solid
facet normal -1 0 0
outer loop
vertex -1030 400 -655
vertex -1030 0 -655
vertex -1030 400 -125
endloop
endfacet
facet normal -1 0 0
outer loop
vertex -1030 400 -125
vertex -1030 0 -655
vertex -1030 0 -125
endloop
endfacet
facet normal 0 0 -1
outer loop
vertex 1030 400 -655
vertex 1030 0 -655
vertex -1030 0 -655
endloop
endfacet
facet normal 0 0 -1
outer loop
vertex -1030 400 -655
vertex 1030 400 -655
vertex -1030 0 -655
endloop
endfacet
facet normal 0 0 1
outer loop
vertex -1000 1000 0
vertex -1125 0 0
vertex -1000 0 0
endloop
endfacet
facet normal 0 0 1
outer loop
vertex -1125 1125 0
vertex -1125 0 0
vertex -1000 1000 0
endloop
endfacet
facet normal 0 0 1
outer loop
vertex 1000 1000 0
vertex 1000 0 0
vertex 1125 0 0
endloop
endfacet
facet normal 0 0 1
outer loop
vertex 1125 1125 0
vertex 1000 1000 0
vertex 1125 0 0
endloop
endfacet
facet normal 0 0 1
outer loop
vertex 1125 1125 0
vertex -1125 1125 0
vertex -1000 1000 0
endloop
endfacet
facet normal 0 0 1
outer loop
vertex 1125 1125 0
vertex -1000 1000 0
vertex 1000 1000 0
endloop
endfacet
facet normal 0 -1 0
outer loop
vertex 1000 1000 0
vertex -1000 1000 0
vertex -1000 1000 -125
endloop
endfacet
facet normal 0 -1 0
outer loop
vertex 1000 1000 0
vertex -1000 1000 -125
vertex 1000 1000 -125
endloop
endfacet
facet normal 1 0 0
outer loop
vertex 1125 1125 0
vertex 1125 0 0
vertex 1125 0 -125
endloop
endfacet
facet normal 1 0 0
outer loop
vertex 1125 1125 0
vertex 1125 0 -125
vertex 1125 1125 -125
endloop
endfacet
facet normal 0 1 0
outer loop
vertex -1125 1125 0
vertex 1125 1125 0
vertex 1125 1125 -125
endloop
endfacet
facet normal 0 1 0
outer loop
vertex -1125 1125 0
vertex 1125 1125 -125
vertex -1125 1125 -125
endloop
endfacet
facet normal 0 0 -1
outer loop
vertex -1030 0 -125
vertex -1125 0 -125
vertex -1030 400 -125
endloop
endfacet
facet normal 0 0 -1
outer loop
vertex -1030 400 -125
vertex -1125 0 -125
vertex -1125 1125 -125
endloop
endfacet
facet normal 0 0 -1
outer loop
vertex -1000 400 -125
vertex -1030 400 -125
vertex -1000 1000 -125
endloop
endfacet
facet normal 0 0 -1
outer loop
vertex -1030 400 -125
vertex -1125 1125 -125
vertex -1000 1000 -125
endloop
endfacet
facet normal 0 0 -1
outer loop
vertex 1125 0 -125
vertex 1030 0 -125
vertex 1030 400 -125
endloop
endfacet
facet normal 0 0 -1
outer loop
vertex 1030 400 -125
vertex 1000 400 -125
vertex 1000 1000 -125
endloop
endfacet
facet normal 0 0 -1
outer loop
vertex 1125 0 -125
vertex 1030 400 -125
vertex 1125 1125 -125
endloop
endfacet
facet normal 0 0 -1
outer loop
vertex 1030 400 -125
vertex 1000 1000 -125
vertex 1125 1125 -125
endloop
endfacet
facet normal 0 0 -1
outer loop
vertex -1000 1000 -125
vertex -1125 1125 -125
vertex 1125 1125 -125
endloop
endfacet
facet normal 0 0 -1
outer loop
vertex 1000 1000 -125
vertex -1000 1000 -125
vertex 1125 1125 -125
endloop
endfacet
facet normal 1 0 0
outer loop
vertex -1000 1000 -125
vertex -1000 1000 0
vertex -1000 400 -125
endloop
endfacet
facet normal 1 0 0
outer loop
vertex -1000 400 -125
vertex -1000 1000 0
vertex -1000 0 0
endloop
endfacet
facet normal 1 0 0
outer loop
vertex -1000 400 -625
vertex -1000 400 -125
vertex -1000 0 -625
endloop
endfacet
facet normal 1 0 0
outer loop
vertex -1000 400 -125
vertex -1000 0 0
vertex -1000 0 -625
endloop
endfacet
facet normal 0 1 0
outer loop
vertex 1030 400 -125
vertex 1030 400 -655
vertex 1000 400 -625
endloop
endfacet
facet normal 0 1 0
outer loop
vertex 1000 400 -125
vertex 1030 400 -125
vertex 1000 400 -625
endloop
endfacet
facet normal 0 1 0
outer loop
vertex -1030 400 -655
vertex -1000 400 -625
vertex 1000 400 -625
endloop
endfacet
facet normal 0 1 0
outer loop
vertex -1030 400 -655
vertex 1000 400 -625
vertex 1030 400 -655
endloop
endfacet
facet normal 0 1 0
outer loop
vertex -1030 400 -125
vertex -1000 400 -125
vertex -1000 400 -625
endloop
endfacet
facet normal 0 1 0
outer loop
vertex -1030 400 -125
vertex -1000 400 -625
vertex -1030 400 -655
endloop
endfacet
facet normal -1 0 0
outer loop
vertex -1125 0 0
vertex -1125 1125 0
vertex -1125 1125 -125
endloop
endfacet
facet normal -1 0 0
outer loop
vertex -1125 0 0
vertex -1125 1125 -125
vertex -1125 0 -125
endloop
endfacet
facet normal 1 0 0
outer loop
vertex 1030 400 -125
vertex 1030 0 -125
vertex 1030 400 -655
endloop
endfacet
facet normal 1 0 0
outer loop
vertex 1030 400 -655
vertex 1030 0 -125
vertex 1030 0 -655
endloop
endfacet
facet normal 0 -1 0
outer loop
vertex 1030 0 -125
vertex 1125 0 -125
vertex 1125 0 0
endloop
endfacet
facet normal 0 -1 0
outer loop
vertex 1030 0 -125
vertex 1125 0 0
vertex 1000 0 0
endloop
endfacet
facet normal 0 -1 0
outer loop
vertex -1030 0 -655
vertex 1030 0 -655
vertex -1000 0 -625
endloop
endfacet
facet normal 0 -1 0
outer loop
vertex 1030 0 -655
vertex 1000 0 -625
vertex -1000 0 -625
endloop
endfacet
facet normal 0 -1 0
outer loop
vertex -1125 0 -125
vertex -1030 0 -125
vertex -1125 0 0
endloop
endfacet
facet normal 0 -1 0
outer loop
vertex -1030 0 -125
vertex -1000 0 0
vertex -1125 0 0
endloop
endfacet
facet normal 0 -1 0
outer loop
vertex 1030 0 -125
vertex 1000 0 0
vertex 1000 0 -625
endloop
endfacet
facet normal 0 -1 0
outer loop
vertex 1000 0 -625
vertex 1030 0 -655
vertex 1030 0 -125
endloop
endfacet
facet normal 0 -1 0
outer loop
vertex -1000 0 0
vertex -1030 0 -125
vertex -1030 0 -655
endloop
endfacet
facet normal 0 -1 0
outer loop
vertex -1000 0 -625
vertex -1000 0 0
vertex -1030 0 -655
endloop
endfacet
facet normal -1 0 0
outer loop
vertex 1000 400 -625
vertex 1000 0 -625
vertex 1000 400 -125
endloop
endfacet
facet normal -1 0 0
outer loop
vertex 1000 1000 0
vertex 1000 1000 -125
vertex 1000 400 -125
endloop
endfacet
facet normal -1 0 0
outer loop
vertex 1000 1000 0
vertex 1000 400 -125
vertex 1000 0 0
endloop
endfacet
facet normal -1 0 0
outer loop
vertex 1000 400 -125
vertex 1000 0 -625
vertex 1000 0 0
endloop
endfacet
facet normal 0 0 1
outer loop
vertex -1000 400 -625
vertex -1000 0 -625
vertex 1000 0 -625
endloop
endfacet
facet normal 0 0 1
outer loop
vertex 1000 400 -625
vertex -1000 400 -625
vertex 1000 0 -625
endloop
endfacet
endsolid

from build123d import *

# Parameters (mm, degrees)
EXTRUDE_1_DEPTH   = 125
EXTRUDE_1_2_DEPTH = 400


with BuildPart() as part:
    # 草图1 → Extrude 1 (new body)
    with BuildSketch(Plane.XY):
        Polygon((-1125, 1125), (-1125, 0), (-1000, 0), (-1000, 1000), (1000, 1000), (1000, 0), (1125, 0), (1125, 1125), align=None)
    extrude(amount=-EXTRUDE_1_DEPTH)

    # 草图2 → Extrude 1 2 (add)
    with BuildSketch(Plane.XZ):
        Polygon((-1000, -125), (-1000, -625), (1000, -625), (1000, -125), (1030, -125), (1030, -655), (-1030, -655), (-1030, -125), align=None)
    extrude(amount=-EXTRUDE_1_2_DEPTH)


solid = part.part
